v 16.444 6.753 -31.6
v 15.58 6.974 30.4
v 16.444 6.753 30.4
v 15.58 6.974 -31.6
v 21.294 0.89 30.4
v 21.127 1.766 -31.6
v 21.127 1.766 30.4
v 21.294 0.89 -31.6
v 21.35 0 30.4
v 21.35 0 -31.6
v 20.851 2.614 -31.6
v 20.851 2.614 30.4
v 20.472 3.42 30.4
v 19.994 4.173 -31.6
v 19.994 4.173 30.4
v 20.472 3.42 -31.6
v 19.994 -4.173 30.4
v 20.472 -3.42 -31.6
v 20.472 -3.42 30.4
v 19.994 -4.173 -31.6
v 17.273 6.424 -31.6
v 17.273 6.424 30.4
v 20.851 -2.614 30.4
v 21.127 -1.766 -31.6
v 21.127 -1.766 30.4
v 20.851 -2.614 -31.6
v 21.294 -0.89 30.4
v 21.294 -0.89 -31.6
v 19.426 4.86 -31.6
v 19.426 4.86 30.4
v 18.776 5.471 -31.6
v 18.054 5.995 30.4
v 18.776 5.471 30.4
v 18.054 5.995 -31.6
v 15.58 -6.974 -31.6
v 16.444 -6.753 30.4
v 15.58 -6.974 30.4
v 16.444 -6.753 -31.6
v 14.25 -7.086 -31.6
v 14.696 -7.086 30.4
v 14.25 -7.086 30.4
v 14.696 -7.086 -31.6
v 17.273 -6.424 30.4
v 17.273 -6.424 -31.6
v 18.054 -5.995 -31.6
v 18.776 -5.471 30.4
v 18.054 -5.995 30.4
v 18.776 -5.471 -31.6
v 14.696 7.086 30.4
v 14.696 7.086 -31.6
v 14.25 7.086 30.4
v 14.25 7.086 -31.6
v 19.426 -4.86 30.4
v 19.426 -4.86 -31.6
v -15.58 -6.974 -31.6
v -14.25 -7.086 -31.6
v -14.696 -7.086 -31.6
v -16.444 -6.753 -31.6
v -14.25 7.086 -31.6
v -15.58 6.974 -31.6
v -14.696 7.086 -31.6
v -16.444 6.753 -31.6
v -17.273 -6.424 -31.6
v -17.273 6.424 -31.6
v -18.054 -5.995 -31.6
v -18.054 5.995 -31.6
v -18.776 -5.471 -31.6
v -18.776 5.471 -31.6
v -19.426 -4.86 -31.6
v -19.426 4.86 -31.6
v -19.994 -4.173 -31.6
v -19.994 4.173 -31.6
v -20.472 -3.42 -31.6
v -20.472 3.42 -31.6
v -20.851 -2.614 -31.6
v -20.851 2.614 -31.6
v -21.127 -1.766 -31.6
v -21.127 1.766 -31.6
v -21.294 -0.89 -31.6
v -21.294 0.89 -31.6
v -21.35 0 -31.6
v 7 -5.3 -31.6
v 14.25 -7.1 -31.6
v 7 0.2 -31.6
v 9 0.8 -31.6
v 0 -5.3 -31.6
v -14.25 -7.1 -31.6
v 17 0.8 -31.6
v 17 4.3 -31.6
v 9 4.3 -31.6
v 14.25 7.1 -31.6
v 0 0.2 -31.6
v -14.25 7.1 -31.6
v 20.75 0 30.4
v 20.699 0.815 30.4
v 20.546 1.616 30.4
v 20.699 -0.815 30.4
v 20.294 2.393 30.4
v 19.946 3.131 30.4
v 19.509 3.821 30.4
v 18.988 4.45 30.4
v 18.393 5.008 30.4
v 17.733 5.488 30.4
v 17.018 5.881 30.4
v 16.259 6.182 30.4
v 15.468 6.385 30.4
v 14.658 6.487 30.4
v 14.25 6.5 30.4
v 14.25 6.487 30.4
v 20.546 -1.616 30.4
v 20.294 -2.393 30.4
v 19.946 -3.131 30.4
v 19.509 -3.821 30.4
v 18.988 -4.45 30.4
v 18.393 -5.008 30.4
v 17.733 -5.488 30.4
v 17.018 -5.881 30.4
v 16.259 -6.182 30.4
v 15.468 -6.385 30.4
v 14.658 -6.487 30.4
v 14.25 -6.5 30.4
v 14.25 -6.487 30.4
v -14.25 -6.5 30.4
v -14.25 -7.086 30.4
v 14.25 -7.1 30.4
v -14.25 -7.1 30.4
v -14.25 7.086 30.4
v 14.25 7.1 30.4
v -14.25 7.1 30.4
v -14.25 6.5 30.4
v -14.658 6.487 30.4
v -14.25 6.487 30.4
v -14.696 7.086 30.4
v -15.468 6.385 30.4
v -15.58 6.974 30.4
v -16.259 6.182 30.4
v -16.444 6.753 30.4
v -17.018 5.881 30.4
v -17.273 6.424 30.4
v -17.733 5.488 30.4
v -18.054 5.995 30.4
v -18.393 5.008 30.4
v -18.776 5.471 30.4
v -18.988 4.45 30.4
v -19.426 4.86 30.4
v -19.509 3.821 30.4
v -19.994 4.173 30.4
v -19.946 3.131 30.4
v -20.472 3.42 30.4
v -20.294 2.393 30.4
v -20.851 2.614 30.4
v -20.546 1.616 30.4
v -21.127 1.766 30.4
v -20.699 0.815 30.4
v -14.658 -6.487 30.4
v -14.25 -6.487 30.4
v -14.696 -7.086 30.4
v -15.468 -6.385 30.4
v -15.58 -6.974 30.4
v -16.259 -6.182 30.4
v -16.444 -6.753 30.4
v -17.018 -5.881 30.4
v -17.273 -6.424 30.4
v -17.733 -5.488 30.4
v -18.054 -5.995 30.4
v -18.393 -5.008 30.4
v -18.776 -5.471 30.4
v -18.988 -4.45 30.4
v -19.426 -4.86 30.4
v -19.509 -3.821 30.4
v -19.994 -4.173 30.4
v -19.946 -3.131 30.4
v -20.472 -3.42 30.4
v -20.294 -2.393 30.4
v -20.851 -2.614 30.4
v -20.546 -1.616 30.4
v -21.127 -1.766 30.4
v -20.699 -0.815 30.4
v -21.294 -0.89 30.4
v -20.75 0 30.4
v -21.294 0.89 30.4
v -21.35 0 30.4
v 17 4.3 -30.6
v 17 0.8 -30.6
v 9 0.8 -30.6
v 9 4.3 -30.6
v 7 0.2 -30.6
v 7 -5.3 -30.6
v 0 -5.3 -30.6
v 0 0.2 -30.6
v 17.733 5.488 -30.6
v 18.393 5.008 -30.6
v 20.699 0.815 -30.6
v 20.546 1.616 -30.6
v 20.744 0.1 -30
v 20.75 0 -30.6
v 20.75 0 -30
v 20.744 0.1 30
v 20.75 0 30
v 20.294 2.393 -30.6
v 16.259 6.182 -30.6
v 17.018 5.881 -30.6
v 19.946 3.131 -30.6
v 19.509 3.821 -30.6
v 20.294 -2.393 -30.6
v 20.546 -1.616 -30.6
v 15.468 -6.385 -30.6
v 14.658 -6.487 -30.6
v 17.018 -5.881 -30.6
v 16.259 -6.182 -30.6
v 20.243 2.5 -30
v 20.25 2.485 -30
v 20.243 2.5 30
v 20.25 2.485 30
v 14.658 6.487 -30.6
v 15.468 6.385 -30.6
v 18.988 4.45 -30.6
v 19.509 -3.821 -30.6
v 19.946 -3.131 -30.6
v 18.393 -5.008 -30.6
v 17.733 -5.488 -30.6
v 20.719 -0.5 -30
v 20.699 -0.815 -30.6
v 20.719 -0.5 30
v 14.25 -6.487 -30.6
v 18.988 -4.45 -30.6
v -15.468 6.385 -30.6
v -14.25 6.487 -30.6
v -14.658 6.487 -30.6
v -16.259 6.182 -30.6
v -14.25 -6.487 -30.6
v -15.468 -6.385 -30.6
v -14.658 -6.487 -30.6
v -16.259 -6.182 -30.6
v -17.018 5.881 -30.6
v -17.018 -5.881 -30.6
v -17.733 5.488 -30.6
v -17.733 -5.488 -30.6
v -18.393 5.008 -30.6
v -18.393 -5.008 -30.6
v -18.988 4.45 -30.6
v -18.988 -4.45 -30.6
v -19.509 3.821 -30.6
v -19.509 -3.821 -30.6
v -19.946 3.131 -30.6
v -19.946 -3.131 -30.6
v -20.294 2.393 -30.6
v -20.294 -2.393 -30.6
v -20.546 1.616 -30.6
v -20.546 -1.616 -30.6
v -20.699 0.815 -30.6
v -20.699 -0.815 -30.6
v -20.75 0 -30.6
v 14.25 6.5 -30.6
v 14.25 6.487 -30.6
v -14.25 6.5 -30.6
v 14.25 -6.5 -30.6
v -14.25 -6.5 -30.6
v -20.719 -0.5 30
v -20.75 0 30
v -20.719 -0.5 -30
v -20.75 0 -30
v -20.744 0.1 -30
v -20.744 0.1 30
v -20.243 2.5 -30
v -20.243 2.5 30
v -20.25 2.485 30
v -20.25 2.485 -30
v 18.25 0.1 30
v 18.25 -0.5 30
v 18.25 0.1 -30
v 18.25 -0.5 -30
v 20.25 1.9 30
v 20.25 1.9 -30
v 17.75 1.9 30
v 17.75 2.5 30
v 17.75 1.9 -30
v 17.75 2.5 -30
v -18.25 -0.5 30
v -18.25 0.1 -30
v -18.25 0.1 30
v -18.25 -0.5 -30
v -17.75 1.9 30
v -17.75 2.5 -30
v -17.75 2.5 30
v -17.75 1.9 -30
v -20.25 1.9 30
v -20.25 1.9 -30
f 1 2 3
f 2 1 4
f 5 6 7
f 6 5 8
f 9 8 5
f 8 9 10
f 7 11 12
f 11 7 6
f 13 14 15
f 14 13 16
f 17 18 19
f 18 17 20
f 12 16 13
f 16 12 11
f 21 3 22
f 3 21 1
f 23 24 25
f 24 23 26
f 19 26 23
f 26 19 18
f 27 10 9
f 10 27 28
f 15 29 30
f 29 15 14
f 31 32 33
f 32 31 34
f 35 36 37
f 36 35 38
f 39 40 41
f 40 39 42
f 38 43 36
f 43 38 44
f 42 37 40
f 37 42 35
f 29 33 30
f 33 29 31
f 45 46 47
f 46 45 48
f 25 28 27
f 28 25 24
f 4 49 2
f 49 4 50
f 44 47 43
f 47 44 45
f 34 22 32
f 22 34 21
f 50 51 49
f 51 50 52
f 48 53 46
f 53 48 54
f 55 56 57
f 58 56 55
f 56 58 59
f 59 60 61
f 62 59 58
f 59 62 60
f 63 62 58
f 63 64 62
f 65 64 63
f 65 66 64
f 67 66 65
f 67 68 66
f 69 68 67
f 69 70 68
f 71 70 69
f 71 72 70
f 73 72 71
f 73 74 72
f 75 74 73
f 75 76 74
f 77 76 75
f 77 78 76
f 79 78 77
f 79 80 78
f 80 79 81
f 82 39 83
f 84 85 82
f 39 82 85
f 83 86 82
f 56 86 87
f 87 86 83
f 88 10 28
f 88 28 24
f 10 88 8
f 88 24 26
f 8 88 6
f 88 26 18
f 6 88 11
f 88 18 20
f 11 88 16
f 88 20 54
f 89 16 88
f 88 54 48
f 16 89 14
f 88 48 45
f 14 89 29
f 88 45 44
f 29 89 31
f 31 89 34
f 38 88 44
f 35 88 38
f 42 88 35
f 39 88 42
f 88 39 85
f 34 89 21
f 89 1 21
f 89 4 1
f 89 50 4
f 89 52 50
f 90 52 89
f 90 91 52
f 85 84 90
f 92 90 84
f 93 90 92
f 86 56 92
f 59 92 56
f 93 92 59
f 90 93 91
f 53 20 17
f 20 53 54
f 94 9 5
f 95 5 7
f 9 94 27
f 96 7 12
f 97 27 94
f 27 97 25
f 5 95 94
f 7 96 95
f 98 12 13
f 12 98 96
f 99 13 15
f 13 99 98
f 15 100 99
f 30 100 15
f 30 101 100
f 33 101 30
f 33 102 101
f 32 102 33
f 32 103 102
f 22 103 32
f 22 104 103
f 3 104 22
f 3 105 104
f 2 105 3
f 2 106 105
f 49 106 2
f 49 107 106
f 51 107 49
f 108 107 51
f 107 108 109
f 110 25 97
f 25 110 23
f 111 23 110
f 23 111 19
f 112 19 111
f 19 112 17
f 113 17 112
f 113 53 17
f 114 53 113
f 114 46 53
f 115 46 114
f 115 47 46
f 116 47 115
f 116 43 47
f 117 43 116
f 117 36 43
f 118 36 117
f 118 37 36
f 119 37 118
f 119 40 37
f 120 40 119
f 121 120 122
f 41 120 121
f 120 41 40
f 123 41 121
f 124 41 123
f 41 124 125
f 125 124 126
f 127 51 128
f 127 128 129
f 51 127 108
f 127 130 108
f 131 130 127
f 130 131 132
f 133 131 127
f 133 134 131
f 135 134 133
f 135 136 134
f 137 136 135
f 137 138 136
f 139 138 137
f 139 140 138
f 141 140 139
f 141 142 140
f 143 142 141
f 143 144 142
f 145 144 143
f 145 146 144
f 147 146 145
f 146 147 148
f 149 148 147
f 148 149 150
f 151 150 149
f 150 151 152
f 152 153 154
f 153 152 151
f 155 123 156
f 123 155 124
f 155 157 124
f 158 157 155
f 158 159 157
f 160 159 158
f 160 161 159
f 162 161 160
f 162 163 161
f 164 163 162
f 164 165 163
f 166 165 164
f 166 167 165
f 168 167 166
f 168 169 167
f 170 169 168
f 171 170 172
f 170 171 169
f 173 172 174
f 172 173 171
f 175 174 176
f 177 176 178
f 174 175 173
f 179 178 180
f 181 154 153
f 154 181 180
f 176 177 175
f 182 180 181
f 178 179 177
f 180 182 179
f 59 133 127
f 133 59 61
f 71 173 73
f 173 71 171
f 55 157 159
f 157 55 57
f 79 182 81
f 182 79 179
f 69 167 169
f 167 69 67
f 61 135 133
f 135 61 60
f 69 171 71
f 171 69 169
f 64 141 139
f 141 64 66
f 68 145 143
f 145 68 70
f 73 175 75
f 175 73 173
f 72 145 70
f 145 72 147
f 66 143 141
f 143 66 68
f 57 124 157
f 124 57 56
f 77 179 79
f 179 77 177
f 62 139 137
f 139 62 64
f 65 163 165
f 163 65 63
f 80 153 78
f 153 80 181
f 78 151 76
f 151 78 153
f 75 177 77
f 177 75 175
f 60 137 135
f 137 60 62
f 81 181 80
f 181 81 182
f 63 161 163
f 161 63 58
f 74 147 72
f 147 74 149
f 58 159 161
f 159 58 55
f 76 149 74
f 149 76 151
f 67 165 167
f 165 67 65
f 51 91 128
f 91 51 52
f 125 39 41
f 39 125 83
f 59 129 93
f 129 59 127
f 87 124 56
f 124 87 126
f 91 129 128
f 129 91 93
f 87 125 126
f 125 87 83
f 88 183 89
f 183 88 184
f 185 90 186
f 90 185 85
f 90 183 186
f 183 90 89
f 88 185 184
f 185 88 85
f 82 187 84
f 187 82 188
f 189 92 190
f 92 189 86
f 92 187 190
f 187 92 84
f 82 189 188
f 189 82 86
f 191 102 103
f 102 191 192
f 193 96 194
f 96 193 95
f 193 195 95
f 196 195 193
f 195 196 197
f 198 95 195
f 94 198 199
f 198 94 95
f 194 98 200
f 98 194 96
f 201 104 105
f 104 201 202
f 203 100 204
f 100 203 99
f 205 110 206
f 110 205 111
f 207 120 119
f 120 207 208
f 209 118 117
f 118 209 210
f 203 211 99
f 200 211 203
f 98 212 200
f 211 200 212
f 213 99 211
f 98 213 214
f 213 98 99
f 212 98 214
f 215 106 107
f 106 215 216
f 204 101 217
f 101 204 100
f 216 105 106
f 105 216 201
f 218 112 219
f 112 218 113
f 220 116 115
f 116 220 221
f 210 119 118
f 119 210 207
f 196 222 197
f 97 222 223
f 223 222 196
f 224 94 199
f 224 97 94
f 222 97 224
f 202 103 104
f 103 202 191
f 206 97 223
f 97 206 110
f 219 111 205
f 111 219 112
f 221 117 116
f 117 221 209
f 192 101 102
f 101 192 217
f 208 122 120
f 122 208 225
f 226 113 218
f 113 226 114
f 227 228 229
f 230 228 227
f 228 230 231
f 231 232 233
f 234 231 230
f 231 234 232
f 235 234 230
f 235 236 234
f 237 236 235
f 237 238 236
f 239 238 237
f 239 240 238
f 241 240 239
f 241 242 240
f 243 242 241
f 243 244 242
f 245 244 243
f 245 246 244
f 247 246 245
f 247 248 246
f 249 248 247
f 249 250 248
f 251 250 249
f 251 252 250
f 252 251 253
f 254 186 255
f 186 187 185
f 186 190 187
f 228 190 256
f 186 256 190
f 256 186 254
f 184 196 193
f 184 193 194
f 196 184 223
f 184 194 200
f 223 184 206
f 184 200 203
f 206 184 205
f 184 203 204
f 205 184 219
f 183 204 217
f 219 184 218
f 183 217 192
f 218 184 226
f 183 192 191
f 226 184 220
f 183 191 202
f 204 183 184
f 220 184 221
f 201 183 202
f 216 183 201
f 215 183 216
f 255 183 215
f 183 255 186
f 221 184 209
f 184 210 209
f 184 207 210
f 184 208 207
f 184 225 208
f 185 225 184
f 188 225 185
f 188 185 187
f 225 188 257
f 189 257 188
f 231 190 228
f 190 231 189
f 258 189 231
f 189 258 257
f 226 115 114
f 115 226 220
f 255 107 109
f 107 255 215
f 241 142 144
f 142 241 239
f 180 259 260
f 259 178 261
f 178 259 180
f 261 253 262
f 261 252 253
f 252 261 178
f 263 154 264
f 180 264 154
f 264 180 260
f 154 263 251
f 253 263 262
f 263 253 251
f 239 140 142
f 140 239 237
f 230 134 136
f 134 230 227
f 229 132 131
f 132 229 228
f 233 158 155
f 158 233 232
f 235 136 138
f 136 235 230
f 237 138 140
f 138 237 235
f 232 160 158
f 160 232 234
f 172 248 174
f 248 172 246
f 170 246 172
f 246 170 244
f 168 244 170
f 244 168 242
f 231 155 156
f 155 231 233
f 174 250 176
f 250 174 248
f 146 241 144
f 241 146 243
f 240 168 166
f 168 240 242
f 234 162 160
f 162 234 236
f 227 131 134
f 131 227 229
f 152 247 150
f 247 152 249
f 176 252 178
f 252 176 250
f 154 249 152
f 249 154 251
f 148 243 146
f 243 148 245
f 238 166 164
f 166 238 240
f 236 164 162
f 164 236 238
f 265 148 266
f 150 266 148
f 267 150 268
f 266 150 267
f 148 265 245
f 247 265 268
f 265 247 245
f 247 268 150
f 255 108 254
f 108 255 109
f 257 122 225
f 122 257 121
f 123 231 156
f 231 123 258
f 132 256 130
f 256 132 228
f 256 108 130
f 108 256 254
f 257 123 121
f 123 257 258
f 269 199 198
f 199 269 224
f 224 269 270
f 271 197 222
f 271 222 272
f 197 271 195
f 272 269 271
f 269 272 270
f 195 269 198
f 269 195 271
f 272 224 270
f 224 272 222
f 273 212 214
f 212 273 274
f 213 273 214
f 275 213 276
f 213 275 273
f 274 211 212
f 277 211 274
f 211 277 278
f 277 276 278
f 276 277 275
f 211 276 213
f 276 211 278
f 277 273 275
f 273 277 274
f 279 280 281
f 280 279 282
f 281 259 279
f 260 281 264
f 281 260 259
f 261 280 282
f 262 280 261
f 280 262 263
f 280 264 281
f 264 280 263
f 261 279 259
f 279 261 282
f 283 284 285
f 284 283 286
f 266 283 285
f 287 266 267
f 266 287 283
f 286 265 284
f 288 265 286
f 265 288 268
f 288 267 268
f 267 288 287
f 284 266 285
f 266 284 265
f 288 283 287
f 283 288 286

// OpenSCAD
// Copyright (c) 2013 Gordon Williams, Pur3 Ltd. See the file LICENSE for copying permission.
// Copyright (c) 2015 Alexander Brevig
//
// Simple Box for Espruino v1.4, based on espruino_box.scad by Gordon Williams
// Open at one end so Espruino slides in
// Can be 3D printed on end

$fn = 50;
INNER_RAD = 6.5;
INNER_LENGTH = 60;
INNER_WIDTH = 41.5;
THICKNESS = 0.6;
END_THICKNESS = 1;
OUTER_RAD = INNER_RAD + THICKNESS;
OUTER_LENGTH = INNER_LENGTH + END_THICKNESS*2;
OUTER_WIDTH = INNER_WIDTH + THICKNESS*2;
GRIP_SIZE = 2.5;
GRIP_OFFSET = 1;

module shape(w,r,l) {
 union() {
  translate([(w/2)-r,0,0]) cylinder(r=r,h=l,center=true);
  translate([r-(w/2),0,0]) cylinder(r=r,h=l,center=true);
  cube([w-r*2,r*2,l], center=true);
 }
}

module board_grip(w,tweak) {
 spacing = THICKNESS + 1.2;
 l = INNER_LENGTH;
 h = THICKNESS; 
 translate([0,-(spacing/2+h/2),0]) cube([w,h,l], center=true);
 translate([tweak,h/2+spacing/2,0]) cube([w,h,l], center=true);
}

module back_cutouts() {
 d = END_THICKNESS+0.2;
 o = -(END_THICKNESS + 0.1);
 translate([13,0.8+0.75,o]) cube([8,3.5,d], center=true); // USB
 translate([3.5,-(0.8+2.75),o]) cube([7,5.5,d], center=true); // Power
}

module side_cutouts() {
 r=2;
 h=THICKNESS+4;
 // ------------------------------------ UNCOMMENT THE NEXT 2 LINES FOR BUTTON HOLES
 // translate([13,0,26.5]) rotate(a=[90,0,0]) cylinder(r=r,h=h,center=true);
 // translate([13,0,38.5]) rotate(a=[90,0,0]) cylinder(r=r,h=h,center=true);
 // ------------------------------------
}

union() {
 difference() {
  translate([0,0,-THICKNESS]) shape(OUTER_WIDTH, OUTER_RAD, OUTER_LENGTH);
  union() {
   translate([0,GRIP_OFFSET,-INNER_LENGTH/2]) back_cutouts();
   shape(INNER_WIDTH, INNER_RAD, INNER_LENGTH+THICKNESS*2);
   translate([0,-(INNER_RAD+OUTER_RAD)/2,-INNER_LENGTH/2]) side_cutouts();
  }
 }
 translate([(INNER_WIDTH-GRIP_SIZE)/2,GRIP_OFFSET,0]) board_grip(GRIP_SIZE,-0.5);
 translate([(GRIP_SIZE-INNER_WIDTH)/2,GRIP_OFFSET,0]) board_grip(GRIP_SIZE,0.5);
}
